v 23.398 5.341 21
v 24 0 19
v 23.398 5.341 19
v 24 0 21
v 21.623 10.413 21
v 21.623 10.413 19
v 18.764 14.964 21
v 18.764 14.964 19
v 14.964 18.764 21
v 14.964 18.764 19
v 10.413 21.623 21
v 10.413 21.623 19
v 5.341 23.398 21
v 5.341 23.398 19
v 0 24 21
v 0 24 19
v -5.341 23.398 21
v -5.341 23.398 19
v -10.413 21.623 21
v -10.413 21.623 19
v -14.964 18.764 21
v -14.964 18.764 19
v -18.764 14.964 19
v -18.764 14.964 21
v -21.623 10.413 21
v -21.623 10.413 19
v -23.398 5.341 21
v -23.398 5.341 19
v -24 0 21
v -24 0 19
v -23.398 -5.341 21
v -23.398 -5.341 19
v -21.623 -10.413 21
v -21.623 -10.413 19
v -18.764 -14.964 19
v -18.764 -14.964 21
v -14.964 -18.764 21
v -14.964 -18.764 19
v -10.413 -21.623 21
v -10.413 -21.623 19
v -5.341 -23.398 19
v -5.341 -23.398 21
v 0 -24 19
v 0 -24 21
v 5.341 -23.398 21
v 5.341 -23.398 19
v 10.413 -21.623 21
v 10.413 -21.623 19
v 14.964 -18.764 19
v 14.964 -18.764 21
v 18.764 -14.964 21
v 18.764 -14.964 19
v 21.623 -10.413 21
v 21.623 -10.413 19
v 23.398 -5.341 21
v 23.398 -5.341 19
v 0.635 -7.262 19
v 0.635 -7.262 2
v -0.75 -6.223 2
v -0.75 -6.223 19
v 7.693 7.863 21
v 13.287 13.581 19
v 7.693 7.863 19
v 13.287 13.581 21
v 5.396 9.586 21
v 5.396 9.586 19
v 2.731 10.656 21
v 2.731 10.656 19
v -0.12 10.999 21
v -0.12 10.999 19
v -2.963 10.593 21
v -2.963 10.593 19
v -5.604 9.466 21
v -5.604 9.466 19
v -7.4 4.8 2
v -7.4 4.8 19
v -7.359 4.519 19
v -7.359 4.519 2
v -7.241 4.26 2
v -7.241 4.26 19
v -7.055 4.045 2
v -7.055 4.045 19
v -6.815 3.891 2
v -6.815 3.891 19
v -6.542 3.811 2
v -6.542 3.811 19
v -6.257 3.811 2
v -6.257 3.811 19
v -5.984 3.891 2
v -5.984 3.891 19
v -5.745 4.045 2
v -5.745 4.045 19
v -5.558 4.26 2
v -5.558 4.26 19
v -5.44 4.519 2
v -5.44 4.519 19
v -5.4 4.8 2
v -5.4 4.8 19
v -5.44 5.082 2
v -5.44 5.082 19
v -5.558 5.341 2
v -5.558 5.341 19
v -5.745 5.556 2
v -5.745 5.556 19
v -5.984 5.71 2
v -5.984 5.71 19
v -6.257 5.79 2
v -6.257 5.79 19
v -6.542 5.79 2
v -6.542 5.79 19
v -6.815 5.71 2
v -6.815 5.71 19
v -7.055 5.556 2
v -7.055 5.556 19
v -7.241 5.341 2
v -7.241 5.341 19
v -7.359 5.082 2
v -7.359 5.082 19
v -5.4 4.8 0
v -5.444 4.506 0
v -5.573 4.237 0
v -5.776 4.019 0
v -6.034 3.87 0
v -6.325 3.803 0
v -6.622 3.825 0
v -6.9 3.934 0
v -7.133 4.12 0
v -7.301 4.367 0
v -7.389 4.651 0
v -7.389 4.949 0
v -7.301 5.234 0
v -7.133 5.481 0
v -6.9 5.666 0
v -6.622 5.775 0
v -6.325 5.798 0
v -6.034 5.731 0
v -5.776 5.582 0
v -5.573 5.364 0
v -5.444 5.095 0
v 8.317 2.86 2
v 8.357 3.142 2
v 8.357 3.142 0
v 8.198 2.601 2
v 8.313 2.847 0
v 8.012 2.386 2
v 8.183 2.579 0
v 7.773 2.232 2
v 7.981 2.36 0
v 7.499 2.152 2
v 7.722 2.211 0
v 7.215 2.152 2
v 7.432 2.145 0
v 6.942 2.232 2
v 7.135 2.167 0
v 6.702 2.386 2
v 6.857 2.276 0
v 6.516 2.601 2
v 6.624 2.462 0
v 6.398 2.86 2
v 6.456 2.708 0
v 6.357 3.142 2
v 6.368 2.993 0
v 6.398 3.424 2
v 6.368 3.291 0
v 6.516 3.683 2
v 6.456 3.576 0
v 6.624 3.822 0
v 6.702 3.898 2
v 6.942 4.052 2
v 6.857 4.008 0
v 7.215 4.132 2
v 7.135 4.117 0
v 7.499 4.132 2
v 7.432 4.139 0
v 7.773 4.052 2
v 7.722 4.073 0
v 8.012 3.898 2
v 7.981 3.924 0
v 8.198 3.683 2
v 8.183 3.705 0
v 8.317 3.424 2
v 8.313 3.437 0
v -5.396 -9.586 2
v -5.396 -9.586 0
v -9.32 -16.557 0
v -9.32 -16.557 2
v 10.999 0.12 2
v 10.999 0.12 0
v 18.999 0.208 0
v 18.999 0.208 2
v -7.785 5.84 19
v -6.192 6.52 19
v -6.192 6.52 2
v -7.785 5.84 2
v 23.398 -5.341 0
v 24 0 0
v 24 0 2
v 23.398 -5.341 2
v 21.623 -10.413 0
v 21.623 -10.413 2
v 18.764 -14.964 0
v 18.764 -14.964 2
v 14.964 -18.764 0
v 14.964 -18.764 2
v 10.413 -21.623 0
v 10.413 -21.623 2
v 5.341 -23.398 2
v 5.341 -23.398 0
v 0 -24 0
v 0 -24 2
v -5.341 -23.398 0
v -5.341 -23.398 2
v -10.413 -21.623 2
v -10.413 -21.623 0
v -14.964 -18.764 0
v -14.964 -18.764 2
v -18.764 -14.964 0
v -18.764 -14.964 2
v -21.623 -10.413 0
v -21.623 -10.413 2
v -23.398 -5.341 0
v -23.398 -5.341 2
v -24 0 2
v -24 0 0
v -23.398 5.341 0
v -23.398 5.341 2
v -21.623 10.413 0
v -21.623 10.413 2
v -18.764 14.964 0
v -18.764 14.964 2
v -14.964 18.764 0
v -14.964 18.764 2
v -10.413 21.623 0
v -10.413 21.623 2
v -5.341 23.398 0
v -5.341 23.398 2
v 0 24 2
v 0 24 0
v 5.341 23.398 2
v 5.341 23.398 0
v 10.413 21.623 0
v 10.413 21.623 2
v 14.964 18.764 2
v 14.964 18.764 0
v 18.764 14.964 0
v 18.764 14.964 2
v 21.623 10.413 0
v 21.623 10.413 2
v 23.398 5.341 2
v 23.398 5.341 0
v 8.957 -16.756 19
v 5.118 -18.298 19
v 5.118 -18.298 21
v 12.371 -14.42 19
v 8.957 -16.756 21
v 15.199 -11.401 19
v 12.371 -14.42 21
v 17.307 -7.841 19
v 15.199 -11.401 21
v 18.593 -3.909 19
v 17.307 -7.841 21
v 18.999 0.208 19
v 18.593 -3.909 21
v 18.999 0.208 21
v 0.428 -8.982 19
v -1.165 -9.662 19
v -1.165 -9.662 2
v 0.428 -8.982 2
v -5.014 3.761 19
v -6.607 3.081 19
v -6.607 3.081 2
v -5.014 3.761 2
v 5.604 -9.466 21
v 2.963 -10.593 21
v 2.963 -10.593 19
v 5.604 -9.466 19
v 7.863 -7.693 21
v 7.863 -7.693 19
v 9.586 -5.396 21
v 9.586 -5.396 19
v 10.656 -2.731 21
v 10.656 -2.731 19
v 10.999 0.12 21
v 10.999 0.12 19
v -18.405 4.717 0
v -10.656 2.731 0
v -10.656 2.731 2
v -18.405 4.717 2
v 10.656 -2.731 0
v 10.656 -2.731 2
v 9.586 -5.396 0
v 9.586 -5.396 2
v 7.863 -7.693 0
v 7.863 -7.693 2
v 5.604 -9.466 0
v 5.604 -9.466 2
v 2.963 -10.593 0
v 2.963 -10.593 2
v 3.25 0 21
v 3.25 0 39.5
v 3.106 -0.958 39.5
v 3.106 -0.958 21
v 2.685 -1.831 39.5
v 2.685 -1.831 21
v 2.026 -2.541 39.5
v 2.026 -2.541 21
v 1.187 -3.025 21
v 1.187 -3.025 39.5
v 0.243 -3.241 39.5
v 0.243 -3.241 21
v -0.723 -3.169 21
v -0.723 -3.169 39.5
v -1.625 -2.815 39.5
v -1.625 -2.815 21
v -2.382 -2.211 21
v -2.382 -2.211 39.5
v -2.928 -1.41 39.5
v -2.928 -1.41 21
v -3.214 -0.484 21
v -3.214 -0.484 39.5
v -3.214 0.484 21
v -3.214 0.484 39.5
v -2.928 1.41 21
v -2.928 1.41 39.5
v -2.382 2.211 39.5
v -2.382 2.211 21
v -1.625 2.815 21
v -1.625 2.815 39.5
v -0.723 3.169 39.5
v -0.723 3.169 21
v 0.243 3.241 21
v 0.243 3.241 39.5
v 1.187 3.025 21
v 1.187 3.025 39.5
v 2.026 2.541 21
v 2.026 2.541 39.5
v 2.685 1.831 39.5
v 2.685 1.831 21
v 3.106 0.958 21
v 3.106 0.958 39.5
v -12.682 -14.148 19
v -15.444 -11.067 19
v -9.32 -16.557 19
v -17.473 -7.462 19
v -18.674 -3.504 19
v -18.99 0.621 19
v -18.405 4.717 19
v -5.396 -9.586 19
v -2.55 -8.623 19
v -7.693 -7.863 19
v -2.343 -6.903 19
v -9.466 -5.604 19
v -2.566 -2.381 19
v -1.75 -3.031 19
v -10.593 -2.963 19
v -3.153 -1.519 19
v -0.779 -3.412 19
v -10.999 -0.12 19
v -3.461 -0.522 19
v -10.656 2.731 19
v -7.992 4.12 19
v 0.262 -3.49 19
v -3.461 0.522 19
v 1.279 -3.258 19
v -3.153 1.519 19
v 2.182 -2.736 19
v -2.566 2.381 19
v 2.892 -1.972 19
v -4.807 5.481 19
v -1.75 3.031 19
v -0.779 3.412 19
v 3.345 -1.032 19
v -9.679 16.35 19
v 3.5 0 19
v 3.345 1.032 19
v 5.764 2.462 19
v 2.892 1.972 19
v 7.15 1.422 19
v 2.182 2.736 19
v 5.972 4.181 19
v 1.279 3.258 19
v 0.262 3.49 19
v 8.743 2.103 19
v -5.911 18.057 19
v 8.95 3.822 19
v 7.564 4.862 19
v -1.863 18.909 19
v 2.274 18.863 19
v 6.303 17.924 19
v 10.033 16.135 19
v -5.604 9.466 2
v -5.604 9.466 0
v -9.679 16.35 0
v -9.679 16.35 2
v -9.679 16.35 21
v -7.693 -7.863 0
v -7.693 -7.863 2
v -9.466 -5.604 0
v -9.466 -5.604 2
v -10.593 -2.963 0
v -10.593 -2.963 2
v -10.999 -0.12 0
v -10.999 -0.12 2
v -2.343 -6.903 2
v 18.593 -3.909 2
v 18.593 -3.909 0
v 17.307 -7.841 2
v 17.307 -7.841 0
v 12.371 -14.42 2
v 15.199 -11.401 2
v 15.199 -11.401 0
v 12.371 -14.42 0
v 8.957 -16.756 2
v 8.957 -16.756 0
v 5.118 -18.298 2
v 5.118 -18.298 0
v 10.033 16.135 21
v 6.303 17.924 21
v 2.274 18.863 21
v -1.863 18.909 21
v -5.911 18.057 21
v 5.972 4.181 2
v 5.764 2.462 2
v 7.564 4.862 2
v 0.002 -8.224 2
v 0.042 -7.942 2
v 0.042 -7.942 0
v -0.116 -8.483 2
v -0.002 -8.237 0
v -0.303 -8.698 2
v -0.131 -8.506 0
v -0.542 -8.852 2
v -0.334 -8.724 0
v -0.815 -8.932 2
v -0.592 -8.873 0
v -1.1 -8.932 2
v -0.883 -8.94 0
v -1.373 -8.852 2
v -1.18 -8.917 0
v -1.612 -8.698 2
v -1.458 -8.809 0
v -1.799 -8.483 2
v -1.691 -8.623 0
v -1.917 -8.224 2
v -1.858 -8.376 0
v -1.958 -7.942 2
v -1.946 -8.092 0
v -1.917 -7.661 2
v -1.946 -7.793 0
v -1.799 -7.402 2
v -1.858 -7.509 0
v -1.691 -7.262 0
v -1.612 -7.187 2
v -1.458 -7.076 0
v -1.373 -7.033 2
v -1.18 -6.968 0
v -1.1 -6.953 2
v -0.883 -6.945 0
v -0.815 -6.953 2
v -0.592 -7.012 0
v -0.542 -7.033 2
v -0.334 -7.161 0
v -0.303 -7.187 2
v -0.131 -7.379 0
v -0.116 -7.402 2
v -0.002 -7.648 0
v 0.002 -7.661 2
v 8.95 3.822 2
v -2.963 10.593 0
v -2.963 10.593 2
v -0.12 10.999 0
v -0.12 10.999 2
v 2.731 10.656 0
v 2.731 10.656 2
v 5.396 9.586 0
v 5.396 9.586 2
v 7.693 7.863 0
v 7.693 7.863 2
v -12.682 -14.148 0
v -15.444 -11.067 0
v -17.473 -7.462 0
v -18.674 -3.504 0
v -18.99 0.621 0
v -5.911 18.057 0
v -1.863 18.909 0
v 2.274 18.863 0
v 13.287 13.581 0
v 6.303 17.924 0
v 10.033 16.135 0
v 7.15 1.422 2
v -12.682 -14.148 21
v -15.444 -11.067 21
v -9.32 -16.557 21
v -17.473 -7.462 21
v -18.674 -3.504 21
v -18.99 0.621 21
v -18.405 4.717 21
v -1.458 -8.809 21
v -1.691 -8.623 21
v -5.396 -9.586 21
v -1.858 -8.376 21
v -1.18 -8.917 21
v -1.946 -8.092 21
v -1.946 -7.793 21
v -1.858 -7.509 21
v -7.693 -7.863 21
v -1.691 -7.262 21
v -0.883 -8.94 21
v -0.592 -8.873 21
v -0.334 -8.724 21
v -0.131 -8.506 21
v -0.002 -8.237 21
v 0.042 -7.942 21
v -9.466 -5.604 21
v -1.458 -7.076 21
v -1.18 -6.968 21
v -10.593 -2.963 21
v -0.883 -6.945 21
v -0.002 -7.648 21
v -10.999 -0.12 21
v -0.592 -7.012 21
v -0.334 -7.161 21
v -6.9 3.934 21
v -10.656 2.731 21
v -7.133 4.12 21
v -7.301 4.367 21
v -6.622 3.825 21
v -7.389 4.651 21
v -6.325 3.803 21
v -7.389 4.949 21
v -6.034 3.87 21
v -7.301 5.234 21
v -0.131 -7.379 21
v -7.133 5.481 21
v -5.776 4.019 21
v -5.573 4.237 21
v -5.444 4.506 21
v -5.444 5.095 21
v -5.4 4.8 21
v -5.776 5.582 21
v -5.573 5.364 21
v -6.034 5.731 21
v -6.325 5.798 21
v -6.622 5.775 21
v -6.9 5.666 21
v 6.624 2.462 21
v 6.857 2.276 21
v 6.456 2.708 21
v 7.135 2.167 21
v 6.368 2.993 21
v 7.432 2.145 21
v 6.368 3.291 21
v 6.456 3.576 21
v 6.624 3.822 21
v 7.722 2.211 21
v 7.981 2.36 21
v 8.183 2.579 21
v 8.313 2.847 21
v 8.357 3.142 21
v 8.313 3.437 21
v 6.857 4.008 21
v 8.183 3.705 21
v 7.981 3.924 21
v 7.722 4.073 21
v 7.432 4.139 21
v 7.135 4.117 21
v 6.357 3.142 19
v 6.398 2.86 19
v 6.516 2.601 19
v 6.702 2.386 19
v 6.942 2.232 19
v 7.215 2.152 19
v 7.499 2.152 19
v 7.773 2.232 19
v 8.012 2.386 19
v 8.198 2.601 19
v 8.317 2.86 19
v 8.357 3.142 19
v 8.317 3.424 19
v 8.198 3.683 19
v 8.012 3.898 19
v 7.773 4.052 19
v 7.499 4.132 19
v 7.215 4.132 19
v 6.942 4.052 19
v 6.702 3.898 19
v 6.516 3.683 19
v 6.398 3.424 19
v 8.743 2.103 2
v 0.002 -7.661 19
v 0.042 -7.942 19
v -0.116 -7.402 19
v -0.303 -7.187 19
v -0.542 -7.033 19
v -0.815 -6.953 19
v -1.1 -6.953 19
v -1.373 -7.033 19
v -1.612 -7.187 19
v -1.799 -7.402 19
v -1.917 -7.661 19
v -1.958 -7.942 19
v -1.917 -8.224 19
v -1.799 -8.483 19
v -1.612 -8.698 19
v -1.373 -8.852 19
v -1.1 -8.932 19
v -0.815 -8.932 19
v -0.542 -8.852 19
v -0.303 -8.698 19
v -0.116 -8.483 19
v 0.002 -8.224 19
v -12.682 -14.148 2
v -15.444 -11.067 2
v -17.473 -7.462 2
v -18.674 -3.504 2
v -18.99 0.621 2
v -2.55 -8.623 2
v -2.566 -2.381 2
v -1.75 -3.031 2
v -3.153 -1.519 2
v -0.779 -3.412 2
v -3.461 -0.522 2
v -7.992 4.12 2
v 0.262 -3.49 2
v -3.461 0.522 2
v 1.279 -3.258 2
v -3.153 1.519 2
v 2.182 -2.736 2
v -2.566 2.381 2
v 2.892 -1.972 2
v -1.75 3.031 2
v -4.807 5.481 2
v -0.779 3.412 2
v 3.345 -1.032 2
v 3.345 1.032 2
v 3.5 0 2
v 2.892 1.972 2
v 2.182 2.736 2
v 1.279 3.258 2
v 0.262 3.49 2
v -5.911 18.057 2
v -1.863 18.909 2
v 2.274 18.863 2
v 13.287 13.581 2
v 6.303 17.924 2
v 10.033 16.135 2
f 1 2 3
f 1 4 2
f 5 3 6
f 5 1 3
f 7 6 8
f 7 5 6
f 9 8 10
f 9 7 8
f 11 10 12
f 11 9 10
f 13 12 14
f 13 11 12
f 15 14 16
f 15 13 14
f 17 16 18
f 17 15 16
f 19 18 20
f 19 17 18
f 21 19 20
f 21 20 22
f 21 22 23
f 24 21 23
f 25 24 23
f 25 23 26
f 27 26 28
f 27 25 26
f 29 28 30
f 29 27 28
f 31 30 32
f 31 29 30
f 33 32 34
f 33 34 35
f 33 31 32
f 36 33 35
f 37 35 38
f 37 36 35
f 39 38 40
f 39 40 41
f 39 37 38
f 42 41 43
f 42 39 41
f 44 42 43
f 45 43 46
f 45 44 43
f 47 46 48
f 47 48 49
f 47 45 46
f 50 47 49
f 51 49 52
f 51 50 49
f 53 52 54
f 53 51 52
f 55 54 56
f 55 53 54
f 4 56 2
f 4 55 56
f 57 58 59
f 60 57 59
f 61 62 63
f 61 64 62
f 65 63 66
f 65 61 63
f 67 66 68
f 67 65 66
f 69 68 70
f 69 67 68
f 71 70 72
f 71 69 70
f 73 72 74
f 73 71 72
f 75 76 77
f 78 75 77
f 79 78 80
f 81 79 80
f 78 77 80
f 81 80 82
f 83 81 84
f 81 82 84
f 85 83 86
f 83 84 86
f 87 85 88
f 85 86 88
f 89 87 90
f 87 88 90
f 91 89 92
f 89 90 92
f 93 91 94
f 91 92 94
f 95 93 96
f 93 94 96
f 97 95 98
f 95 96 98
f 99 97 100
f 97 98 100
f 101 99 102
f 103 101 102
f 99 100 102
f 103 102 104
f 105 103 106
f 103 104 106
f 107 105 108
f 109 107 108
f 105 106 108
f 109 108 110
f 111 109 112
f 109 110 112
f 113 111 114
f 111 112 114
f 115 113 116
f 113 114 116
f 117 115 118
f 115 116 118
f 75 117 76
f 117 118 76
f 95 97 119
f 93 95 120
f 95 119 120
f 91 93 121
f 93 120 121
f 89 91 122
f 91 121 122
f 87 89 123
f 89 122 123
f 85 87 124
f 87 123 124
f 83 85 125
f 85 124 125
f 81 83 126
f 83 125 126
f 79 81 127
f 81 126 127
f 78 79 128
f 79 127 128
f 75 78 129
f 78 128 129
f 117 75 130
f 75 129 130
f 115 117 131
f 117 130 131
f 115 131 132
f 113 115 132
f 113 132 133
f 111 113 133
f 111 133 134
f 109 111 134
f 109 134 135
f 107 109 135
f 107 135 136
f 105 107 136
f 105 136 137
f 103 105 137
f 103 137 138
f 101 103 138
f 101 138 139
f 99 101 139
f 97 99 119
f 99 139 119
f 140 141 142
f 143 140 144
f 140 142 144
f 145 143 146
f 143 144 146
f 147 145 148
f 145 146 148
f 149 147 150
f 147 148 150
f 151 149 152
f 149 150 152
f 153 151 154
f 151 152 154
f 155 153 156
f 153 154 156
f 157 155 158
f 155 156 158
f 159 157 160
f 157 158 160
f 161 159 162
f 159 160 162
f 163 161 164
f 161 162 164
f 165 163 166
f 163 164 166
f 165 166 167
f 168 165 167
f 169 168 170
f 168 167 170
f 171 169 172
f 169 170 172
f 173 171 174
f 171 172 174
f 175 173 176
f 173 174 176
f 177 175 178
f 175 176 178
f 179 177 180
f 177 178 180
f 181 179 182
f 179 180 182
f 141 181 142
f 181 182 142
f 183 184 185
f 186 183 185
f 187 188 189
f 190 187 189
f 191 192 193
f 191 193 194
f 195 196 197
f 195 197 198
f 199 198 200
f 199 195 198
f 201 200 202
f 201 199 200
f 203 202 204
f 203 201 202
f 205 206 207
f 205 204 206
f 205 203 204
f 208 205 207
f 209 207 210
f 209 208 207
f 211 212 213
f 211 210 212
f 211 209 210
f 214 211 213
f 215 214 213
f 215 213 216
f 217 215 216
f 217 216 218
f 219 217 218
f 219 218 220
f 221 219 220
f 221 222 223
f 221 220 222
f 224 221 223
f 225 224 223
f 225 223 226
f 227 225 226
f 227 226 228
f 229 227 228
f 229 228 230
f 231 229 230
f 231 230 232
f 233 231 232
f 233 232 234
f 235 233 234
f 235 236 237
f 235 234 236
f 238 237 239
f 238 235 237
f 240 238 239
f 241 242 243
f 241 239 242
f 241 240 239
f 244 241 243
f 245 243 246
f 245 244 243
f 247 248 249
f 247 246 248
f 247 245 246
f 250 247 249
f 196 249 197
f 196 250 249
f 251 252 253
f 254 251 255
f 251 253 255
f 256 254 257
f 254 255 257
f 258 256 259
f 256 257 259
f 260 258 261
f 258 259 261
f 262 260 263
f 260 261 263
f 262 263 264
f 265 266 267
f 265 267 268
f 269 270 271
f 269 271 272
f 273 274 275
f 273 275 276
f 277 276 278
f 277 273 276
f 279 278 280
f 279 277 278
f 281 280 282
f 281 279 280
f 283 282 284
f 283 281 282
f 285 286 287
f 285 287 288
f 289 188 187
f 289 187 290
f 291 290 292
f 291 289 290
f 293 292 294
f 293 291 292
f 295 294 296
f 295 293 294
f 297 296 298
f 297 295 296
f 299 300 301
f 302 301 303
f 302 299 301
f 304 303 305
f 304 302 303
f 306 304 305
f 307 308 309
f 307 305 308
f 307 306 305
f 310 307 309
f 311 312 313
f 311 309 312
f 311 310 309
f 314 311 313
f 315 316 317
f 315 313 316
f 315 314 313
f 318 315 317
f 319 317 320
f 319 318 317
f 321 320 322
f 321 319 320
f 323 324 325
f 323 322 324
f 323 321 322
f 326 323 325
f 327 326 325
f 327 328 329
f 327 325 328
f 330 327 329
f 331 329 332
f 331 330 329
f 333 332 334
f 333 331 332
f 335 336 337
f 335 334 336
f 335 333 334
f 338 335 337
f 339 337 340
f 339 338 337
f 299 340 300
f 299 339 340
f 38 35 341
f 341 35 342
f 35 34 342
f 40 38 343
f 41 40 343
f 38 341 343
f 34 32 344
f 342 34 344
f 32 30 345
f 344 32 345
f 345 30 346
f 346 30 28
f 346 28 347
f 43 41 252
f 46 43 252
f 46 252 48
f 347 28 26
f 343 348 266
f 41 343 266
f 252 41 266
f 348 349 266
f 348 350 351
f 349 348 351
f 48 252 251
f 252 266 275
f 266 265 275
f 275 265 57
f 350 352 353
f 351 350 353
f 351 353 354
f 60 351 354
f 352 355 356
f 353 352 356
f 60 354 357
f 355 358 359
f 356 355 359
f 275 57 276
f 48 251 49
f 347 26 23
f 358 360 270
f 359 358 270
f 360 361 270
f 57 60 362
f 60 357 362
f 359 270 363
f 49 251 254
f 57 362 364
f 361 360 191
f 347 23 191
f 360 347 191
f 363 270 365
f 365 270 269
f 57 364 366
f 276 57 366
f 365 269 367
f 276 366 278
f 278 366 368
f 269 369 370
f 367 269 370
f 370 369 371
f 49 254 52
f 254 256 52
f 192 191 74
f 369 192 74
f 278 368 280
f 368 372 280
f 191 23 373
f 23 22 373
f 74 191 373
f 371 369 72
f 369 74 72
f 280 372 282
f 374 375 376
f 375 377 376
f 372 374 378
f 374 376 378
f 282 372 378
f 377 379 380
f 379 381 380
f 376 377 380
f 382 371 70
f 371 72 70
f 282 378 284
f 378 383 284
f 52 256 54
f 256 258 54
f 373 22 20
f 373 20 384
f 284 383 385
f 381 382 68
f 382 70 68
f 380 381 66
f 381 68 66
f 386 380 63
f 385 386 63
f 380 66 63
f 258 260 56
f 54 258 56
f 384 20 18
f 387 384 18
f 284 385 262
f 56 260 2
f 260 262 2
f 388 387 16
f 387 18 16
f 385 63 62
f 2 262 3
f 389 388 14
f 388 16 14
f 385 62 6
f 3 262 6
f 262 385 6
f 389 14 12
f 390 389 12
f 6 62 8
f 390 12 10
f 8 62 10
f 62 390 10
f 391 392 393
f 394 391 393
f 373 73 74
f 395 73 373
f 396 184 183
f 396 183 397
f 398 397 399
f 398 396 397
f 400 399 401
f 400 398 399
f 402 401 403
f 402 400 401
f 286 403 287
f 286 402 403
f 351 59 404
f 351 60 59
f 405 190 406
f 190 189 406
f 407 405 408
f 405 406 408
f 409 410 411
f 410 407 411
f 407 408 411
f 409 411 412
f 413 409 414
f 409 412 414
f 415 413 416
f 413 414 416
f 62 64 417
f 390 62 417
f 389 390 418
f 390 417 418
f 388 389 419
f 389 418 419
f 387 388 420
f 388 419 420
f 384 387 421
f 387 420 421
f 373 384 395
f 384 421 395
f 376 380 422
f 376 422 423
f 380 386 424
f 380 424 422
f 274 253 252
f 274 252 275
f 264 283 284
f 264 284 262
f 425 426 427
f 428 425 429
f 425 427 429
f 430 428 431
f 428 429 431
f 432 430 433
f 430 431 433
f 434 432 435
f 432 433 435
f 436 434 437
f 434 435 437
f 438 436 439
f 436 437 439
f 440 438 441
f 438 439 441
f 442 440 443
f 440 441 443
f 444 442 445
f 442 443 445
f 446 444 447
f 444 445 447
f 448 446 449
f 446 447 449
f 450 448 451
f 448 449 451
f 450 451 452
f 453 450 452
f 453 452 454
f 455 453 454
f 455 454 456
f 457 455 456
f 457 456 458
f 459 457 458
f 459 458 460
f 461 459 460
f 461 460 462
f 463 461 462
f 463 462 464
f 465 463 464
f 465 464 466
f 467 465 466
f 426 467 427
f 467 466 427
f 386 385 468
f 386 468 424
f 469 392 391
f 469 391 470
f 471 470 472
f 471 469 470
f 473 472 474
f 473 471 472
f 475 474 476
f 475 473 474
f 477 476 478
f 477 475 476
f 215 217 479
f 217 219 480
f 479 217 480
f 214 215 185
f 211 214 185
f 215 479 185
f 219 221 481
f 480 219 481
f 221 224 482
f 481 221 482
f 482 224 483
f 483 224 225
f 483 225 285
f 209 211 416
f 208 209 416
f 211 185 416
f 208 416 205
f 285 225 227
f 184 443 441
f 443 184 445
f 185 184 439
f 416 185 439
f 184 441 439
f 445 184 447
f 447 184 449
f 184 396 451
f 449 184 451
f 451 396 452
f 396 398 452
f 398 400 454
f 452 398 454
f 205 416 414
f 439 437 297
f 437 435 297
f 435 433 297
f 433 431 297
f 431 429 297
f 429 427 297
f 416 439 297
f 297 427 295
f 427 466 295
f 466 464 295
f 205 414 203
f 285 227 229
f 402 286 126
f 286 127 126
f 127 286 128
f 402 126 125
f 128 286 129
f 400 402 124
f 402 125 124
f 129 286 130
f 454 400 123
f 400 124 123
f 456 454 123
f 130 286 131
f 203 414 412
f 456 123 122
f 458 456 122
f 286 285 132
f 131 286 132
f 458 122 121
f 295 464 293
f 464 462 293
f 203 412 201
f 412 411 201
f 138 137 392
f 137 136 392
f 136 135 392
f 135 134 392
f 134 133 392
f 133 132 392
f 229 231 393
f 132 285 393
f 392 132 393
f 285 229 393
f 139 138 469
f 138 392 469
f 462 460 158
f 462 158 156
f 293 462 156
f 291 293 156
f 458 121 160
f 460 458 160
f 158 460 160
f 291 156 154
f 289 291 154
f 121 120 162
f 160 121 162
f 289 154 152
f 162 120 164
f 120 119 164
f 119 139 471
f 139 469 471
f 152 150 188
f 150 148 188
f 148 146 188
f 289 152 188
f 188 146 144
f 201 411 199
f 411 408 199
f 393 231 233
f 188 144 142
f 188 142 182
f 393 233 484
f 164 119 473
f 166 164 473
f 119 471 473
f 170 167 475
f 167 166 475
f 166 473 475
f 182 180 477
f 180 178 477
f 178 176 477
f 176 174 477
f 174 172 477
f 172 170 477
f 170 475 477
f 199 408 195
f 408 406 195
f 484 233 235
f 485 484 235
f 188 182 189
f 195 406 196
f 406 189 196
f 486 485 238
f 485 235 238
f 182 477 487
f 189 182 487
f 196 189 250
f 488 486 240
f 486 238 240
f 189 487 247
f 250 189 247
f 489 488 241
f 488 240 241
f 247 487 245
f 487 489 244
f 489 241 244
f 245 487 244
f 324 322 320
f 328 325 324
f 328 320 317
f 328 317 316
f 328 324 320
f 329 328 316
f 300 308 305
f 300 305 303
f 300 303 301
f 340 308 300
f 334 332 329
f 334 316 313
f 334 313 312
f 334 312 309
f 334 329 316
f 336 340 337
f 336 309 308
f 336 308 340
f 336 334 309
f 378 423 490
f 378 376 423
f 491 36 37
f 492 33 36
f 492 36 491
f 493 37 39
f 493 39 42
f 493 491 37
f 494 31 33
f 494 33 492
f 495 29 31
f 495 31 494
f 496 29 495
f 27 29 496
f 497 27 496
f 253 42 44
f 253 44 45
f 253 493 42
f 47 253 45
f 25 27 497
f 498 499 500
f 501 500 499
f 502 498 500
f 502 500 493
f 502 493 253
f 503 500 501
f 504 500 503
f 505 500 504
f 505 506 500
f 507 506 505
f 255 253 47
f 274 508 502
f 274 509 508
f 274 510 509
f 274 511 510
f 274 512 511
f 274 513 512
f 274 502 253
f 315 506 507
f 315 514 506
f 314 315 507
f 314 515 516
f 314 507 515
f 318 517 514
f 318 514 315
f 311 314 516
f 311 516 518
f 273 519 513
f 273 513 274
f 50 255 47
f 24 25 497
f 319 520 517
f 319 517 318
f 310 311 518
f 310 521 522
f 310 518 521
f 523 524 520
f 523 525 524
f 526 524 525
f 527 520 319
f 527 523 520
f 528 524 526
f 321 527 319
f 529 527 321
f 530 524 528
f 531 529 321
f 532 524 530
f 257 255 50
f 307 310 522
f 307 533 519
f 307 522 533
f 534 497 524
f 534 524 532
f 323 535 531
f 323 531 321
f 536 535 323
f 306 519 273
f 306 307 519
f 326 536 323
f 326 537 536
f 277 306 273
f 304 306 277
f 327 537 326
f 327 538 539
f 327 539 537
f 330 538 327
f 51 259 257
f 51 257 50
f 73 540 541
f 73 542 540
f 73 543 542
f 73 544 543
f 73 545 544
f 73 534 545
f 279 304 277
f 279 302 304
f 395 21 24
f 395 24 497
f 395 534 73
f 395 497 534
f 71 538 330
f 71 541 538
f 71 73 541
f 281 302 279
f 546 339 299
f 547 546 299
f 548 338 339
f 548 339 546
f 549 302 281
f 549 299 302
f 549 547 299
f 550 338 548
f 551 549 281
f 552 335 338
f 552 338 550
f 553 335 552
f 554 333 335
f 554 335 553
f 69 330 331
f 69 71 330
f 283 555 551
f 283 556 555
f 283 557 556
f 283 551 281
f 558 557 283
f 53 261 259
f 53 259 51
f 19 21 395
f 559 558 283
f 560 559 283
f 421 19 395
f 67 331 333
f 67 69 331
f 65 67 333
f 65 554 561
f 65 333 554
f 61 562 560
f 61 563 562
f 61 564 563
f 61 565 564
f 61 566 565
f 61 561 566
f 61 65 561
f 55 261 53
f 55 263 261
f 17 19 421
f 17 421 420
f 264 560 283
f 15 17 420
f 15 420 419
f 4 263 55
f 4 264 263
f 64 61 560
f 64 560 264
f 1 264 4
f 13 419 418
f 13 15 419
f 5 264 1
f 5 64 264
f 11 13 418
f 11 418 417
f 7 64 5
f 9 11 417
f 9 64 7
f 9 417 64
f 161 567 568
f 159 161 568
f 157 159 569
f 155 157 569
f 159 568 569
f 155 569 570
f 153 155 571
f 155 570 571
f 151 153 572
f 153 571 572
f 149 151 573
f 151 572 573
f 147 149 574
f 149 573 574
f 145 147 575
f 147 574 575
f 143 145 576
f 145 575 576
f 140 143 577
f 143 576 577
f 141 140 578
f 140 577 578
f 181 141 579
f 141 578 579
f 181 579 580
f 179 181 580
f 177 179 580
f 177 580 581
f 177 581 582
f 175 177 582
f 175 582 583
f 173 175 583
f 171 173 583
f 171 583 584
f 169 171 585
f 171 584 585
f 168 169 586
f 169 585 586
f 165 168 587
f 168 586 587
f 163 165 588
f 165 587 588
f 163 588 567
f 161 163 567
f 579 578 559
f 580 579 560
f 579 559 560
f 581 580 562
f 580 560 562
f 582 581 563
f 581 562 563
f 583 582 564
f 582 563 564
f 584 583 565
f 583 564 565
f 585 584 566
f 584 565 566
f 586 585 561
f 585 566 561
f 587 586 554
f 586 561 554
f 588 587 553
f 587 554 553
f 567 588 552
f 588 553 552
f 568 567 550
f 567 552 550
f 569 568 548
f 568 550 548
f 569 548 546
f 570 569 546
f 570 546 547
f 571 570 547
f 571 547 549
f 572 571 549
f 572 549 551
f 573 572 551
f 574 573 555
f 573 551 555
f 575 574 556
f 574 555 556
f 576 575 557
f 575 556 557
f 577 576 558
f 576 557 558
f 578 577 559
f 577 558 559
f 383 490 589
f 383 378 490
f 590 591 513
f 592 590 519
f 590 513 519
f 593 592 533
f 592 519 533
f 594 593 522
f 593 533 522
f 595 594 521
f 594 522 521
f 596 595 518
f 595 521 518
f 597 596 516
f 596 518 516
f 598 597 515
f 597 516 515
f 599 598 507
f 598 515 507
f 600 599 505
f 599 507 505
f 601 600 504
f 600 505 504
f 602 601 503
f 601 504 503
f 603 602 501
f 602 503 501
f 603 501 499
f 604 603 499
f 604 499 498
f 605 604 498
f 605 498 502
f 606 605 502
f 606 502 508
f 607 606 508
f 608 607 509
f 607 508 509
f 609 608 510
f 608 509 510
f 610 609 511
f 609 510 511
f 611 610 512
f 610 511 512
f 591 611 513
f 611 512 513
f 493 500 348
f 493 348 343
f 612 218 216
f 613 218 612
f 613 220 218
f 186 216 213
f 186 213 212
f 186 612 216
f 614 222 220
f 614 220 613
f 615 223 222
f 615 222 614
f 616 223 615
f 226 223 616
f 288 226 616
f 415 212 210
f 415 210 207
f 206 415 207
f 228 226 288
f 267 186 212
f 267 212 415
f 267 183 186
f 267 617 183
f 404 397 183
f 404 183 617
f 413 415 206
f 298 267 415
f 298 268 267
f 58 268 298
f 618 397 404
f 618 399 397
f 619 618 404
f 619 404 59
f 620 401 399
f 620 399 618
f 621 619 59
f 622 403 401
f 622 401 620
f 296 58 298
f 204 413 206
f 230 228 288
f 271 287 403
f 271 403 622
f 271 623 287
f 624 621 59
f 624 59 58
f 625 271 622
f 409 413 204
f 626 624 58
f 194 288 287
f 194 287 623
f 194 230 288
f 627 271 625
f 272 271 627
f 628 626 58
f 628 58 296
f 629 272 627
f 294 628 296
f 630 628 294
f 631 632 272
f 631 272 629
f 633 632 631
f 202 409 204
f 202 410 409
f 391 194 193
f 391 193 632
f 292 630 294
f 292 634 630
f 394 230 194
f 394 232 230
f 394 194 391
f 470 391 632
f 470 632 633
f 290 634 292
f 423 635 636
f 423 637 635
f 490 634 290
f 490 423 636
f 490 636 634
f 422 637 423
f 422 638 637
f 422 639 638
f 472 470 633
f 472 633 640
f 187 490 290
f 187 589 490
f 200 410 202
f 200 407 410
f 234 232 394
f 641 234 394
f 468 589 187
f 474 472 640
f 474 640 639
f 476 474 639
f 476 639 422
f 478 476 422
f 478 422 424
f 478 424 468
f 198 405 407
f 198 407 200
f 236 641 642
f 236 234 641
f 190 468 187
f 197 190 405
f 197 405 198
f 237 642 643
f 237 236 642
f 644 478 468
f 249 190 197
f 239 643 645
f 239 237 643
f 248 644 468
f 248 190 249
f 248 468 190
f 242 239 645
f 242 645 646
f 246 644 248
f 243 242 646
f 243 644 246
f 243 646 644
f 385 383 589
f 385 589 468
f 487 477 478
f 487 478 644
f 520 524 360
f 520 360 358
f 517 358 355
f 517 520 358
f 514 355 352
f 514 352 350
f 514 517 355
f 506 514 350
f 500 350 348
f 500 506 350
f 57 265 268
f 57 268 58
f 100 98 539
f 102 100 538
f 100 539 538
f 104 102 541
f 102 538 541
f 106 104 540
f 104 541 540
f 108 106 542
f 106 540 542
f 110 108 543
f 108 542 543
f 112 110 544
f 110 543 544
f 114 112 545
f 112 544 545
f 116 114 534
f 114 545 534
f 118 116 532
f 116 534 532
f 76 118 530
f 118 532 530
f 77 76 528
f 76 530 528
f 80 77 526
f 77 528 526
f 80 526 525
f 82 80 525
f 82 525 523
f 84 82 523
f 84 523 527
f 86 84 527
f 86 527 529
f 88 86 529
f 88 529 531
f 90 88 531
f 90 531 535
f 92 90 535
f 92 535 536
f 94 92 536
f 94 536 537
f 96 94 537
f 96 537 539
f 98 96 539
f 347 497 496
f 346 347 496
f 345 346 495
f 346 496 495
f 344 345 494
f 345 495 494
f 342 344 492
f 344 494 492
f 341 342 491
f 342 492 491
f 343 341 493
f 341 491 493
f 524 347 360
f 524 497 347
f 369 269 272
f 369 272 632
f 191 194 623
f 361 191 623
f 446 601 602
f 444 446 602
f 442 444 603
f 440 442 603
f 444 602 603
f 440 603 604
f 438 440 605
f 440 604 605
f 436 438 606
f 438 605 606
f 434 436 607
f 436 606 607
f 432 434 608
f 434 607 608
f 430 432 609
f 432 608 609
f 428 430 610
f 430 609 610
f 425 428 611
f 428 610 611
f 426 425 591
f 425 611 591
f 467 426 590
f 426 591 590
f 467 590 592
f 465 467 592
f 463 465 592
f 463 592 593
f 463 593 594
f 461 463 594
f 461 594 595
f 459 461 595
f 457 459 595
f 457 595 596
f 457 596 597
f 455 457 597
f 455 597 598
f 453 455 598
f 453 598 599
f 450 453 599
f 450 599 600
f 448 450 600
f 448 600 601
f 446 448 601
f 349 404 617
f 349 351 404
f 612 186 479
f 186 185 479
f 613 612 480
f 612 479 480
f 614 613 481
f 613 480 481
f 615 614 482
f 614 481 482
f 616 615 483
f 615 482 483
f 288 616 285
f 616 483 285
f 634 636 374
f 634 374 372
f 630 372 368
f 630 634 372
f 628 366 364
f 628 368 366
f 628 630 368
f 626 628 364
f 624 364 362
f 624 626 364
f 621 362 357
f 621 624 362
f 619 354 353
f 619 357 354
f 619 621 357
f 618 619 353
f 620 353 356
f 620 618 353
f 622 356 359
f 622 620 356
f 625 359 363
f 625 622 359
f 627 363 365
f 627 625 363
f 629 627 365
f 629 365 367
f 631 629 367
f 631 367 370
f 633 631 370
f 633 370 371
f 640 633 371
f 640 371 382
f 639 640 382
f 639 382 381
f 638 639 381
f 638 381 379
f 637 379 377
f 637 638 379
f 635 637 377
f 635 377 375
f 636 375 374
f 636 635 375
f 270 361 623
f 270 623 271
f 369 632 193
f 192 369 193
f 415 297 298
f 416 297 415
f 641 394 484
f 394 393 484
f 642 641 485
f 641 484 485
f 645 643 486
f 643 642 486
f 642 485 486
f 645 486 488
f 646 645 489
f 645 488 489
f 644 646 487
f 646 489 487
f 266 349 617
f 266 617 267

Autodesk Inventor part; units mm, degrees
ref_plane "YZ Plane" through (0, 0, 0) normal (1, 0, 0) x (0, 1, 0)
ref_plane "XZ Plane" through (0, 0, 0) normal (0, 1, 0) x (-1, 0, 0)
ref_plane "XY Plane" through (0, 0, 0) normal (0, 0, 1) x (1, 0, 0)
sketch "Sketch1" plane through (0, 0, 0) normal (0, 0, 1) x (1, 0, 0)
  circle A0 centre (0, 0) radius 24
  circle A1 centre (0, 0) radius 3.5
  arc A2 (7.6927, 7.8627) -> (-5.6038, 9.4656) centre (0, 0) ccw
  line L0 (0, 0) -> (7.6927, 7.8627) construction
  line L1 (0, 0) -> (-5.6038, 9.4656) construction
  arc A3 (13.2874, 13.5811) -> (-9.6793, 16.3497) centre (0, 0) ccw
  line L2 (0, 0) -> (13.2874, 13.5811) construction
  line L3 (0, 0) -> (-9.6793, 16.3497) construction
  line L4 (-5.6038, 9.4656) -> (-9.6793, 16.3497)
  line L5 (7.6927, 7.8627) -> (13.2874, 13.5811)
  arc A4 (5.1178, -18.2977) -> (18.9989, 0.2077) centre (0, 0) ccw
  line L6 (0, 0) -> (18.9989, 0.2077) construction
  line L7 (10.9993, 0.1202) -> (18.9989, 0.2077)
  line L8 (0, 0) -> (5.1178, -18.2977) construction
  line L9 (2.963, -10.5934) -> (5.1178, -18.2977)
  arc A5 (2.963, -10.5934) -> (10.9993, 0.1202) centre (0, 0) ccw
  arc A6 (-18.4052, 4.7167) -> (-9.3196, -16.5573) centre (0, 0) ccw
  line L10 (0, 0) -> (-9.3196, -16.5573) construction
  line L11 (-5.3956, -9.5858) -> (-9.3196, -16.5573)
  line L12 (0, 0) -> (-18.4052, 4.7167) construction
  line L13 (-10.6557, 2.7307) -> (-18.4052, 4.7167)
  arc A7 (-10.6557, 2.7307) -> (-5.3956, -9.5858) centre (0, 0) ccw
  circle A8 centre (-6.3997, 4.8004) radius 1
  line L14 (-6.3997, 4.8004) -> (0, 0) construction
  circle A9 centre (-0.9575, -7.9425) radius 1
  circle A10 centre (7.3571, 3.1421) radius 1
  dimension "d0" = 48
  dimension "d1" = 7
  dimension "d2" = 11
  dimension "a1" = 75
  dimension "d4" = 19
  dimension "d5" = 75
  dimension "d8" = 360
  dimension "d10" = 2
  dimension "d11" = 8
  dimension "d12" = 22.5
  dimension "d15" = 360
extrude "Extrusion1" add sketch "Sketch1" along normal blind 2
extrude "Extrusion2" add sketch "Sketch1" along normal blind 21 contours A1
sketch "Sketch2" plane through (0, 0, 21) normal (0, 0, 1) x (1, 0, 0)
  line L0 (-18.4052, 4.7167) -> (-10.6557, 2.7307) projected
  arc A0 (-10.6557, 2.7307) -> (-5.3956, -9.5858) centre (0, 0) ccw projected
  line L1 (-5.3956, -9.5858) -> (-9.3196, -16.5573) projected
  arc A1 (-18.4052, 4.7167) -> (-9.3196, -16.5573) centre (0, 0) ccw projected
  line L2 (5.1178, -18.2977) -> (2.963, -10.5934) projected
  arc A2 (2.963, -10.5934) -> (10.9993, 0.1202) centre (0, 0) ccw projected
  line L3 (10.9993, 0.1202) -> (18.9989, 0.2077) projected
  arc A3 (5.1178, -18.2977) -> (18.9989, 0.2077) centre (0, 0) ccw projected
  line L4 (-5.6038, 9.4656) -> (-9.6793, 16.3497) projected
  arc A4 (13.2874, 13.5811) -> (-9.6793, 16.3497) centre (0, 0) ccw projected
  line L5 (13.2874, 13.5811) -> (7.6927, 7.8627) projected
  arc A5 (7.6927, 7.8627) -> (-5.6038, 9.4656) centre (0, 0) ccw projected
  circle A6 centre (0, 0) radius 3.5 projected
  circle A7 centre (7.3571, 3.1421) radius 1 projected
  circle A8 centre (-0.9575, -7.9425) radius 1 projected
  circle A9 centre (-6.3997, 4.8004) radius 1 projected
  circle A10 centre (0, 0) radius 24 projected
extrude "Extrusion3" add sketch "Sketch2" against normal blind 2
sketch "Sketch3" plane through (0, 0, 19) normal (0, 0, -1) x (-1, 0, 0)
  circle A0 centre (0, 0) radius 24 projected
  circle A1 centre (-7.3571, 3.1421) radius 1 projected
  circle A2 centre (0.9575, -7.9425) radius 1 projected
  circle A3 centre (6.3997, 4.8004) radius 1 projected
  arc A4 (9.3196, -16.5573) -> (18.4052, 4.7167) centre (0, 0) ccw projected
  line L0 (18.4052, 4.7167) -> (10.6557, 2.7307) projected
  arc A5 (5.3956, -9.5858) -> (10.6557, 2.7307) centre (0, 0) ccw projected
  line L1 (5.3956, -9.5858) -> (9.3196, -16.5573) projected
  arc A6 (-18.9989, 0.2077) -> (-5.1178, -18.2977) centre (0, 0) ccw projected
  line L2 (-5.1178, -18.2977) -> (-2.963, -10.5934) projected
  arc A7 (-10.9993, 0.1202) -> (-2.963, -10.5934) centre (0, 0) ccw projected
  line L3 (-10.9993, 0.1202) -> (-18.9989, 0.2077) projected
  arc A8 (5.6038, 9.4656) -> (-7.6927, 7.8627) centre (0, 0) ccw projected
  line L4 (5.6038, 9.4656) -> (9.6793, 16.3497) projected
  arc A9 (9.6793, 16.3497) -> (-13.2874, 13.5811) centre (0, 0) ccw projected
  line L5 (-13.2874, 13.5811) -> (-7.6927, 7.8627) projected
  circle A10 centre (0.9575, -7.9425) radius 1 projected
  line L6 (-0.6354, -7.2622) -> (0.7502, -6.2229)
  line L7 (0.7502, -6.2229) -> (2.343, -6.9032)
  line L8 (2.343, -6.9032) -> (2.5503, -8.6228)
  line L9 (2.5503, -8.6228) -> (1.1648, -9.6621)
  line L10 (1.1648, -9.6621) -> (-0.4281, -8.9818)
  line L11 (-0.4281, -8.9818) -> (-0.6354, -7.2622)
  line L12 (0, 0) -> (0.9575, -7.9425) construction
  line L13 (0, 0) -> (6.3997, 4.8004) construction
  line L14 (7.9925, 4.1202) -> (6.607, 3.0808)
  line L15 (6.607, 3.0808) -> (5.0141, 3.7611)
  line L16 (5.0141, 3.7611) -> (4.8068, 5.4807)
  line L17 (7.7852, 5.8398) -> (7.9925, 4.1202)
  line L18 (4.8068, 5.4807) -> (6.1924, 6.52)
  line L19 (6.1924, 6.52) -> (7.7852, 5.8398)
  line L20 (0, 0) -> (-7.3571, 3.1421) construction
  line L21 (-7.5644, 4.8617) -> (-5.9716, 4.1814)
  line L22 (-5.9716, 4.1814) -> (-5.7643, 2.4618)
  line L23 (-5.7643, 2.4618) -> (-7.1498, 1.4225)
  line L24 (-8.95, 3.8223) -> (-7.5644, 4.8617)
  line L25 (-7.1498, 1.4225) -> (-8.7427, 2.1027)
  line L26 (-8.7427, 2.1027) -> (-8.95, 3.8223)
  dimension "d23" = 3
  dimension "d26" = 360
extrude "Extrusion4" add sketch "Sketch3" along normal blind 17 contours L6 L7 L8 L9 L10 L11 | L14 L15 L16 L18 L19 L17 | L21 L22 L23 L25 L26 L24
sketch "Sketch4" plane through (0, 0, 21) normal (0, 0, 1) x (1, 0, 0)
  circle A0 centre (0, 0) radius 3.25
  dimension "d30" = 6.5
extrude "Extrusion5" add sketch "Sketch4" along normal blind 18.5
equation "\"d5\" = a1"
properties part number "platform_wheel"
